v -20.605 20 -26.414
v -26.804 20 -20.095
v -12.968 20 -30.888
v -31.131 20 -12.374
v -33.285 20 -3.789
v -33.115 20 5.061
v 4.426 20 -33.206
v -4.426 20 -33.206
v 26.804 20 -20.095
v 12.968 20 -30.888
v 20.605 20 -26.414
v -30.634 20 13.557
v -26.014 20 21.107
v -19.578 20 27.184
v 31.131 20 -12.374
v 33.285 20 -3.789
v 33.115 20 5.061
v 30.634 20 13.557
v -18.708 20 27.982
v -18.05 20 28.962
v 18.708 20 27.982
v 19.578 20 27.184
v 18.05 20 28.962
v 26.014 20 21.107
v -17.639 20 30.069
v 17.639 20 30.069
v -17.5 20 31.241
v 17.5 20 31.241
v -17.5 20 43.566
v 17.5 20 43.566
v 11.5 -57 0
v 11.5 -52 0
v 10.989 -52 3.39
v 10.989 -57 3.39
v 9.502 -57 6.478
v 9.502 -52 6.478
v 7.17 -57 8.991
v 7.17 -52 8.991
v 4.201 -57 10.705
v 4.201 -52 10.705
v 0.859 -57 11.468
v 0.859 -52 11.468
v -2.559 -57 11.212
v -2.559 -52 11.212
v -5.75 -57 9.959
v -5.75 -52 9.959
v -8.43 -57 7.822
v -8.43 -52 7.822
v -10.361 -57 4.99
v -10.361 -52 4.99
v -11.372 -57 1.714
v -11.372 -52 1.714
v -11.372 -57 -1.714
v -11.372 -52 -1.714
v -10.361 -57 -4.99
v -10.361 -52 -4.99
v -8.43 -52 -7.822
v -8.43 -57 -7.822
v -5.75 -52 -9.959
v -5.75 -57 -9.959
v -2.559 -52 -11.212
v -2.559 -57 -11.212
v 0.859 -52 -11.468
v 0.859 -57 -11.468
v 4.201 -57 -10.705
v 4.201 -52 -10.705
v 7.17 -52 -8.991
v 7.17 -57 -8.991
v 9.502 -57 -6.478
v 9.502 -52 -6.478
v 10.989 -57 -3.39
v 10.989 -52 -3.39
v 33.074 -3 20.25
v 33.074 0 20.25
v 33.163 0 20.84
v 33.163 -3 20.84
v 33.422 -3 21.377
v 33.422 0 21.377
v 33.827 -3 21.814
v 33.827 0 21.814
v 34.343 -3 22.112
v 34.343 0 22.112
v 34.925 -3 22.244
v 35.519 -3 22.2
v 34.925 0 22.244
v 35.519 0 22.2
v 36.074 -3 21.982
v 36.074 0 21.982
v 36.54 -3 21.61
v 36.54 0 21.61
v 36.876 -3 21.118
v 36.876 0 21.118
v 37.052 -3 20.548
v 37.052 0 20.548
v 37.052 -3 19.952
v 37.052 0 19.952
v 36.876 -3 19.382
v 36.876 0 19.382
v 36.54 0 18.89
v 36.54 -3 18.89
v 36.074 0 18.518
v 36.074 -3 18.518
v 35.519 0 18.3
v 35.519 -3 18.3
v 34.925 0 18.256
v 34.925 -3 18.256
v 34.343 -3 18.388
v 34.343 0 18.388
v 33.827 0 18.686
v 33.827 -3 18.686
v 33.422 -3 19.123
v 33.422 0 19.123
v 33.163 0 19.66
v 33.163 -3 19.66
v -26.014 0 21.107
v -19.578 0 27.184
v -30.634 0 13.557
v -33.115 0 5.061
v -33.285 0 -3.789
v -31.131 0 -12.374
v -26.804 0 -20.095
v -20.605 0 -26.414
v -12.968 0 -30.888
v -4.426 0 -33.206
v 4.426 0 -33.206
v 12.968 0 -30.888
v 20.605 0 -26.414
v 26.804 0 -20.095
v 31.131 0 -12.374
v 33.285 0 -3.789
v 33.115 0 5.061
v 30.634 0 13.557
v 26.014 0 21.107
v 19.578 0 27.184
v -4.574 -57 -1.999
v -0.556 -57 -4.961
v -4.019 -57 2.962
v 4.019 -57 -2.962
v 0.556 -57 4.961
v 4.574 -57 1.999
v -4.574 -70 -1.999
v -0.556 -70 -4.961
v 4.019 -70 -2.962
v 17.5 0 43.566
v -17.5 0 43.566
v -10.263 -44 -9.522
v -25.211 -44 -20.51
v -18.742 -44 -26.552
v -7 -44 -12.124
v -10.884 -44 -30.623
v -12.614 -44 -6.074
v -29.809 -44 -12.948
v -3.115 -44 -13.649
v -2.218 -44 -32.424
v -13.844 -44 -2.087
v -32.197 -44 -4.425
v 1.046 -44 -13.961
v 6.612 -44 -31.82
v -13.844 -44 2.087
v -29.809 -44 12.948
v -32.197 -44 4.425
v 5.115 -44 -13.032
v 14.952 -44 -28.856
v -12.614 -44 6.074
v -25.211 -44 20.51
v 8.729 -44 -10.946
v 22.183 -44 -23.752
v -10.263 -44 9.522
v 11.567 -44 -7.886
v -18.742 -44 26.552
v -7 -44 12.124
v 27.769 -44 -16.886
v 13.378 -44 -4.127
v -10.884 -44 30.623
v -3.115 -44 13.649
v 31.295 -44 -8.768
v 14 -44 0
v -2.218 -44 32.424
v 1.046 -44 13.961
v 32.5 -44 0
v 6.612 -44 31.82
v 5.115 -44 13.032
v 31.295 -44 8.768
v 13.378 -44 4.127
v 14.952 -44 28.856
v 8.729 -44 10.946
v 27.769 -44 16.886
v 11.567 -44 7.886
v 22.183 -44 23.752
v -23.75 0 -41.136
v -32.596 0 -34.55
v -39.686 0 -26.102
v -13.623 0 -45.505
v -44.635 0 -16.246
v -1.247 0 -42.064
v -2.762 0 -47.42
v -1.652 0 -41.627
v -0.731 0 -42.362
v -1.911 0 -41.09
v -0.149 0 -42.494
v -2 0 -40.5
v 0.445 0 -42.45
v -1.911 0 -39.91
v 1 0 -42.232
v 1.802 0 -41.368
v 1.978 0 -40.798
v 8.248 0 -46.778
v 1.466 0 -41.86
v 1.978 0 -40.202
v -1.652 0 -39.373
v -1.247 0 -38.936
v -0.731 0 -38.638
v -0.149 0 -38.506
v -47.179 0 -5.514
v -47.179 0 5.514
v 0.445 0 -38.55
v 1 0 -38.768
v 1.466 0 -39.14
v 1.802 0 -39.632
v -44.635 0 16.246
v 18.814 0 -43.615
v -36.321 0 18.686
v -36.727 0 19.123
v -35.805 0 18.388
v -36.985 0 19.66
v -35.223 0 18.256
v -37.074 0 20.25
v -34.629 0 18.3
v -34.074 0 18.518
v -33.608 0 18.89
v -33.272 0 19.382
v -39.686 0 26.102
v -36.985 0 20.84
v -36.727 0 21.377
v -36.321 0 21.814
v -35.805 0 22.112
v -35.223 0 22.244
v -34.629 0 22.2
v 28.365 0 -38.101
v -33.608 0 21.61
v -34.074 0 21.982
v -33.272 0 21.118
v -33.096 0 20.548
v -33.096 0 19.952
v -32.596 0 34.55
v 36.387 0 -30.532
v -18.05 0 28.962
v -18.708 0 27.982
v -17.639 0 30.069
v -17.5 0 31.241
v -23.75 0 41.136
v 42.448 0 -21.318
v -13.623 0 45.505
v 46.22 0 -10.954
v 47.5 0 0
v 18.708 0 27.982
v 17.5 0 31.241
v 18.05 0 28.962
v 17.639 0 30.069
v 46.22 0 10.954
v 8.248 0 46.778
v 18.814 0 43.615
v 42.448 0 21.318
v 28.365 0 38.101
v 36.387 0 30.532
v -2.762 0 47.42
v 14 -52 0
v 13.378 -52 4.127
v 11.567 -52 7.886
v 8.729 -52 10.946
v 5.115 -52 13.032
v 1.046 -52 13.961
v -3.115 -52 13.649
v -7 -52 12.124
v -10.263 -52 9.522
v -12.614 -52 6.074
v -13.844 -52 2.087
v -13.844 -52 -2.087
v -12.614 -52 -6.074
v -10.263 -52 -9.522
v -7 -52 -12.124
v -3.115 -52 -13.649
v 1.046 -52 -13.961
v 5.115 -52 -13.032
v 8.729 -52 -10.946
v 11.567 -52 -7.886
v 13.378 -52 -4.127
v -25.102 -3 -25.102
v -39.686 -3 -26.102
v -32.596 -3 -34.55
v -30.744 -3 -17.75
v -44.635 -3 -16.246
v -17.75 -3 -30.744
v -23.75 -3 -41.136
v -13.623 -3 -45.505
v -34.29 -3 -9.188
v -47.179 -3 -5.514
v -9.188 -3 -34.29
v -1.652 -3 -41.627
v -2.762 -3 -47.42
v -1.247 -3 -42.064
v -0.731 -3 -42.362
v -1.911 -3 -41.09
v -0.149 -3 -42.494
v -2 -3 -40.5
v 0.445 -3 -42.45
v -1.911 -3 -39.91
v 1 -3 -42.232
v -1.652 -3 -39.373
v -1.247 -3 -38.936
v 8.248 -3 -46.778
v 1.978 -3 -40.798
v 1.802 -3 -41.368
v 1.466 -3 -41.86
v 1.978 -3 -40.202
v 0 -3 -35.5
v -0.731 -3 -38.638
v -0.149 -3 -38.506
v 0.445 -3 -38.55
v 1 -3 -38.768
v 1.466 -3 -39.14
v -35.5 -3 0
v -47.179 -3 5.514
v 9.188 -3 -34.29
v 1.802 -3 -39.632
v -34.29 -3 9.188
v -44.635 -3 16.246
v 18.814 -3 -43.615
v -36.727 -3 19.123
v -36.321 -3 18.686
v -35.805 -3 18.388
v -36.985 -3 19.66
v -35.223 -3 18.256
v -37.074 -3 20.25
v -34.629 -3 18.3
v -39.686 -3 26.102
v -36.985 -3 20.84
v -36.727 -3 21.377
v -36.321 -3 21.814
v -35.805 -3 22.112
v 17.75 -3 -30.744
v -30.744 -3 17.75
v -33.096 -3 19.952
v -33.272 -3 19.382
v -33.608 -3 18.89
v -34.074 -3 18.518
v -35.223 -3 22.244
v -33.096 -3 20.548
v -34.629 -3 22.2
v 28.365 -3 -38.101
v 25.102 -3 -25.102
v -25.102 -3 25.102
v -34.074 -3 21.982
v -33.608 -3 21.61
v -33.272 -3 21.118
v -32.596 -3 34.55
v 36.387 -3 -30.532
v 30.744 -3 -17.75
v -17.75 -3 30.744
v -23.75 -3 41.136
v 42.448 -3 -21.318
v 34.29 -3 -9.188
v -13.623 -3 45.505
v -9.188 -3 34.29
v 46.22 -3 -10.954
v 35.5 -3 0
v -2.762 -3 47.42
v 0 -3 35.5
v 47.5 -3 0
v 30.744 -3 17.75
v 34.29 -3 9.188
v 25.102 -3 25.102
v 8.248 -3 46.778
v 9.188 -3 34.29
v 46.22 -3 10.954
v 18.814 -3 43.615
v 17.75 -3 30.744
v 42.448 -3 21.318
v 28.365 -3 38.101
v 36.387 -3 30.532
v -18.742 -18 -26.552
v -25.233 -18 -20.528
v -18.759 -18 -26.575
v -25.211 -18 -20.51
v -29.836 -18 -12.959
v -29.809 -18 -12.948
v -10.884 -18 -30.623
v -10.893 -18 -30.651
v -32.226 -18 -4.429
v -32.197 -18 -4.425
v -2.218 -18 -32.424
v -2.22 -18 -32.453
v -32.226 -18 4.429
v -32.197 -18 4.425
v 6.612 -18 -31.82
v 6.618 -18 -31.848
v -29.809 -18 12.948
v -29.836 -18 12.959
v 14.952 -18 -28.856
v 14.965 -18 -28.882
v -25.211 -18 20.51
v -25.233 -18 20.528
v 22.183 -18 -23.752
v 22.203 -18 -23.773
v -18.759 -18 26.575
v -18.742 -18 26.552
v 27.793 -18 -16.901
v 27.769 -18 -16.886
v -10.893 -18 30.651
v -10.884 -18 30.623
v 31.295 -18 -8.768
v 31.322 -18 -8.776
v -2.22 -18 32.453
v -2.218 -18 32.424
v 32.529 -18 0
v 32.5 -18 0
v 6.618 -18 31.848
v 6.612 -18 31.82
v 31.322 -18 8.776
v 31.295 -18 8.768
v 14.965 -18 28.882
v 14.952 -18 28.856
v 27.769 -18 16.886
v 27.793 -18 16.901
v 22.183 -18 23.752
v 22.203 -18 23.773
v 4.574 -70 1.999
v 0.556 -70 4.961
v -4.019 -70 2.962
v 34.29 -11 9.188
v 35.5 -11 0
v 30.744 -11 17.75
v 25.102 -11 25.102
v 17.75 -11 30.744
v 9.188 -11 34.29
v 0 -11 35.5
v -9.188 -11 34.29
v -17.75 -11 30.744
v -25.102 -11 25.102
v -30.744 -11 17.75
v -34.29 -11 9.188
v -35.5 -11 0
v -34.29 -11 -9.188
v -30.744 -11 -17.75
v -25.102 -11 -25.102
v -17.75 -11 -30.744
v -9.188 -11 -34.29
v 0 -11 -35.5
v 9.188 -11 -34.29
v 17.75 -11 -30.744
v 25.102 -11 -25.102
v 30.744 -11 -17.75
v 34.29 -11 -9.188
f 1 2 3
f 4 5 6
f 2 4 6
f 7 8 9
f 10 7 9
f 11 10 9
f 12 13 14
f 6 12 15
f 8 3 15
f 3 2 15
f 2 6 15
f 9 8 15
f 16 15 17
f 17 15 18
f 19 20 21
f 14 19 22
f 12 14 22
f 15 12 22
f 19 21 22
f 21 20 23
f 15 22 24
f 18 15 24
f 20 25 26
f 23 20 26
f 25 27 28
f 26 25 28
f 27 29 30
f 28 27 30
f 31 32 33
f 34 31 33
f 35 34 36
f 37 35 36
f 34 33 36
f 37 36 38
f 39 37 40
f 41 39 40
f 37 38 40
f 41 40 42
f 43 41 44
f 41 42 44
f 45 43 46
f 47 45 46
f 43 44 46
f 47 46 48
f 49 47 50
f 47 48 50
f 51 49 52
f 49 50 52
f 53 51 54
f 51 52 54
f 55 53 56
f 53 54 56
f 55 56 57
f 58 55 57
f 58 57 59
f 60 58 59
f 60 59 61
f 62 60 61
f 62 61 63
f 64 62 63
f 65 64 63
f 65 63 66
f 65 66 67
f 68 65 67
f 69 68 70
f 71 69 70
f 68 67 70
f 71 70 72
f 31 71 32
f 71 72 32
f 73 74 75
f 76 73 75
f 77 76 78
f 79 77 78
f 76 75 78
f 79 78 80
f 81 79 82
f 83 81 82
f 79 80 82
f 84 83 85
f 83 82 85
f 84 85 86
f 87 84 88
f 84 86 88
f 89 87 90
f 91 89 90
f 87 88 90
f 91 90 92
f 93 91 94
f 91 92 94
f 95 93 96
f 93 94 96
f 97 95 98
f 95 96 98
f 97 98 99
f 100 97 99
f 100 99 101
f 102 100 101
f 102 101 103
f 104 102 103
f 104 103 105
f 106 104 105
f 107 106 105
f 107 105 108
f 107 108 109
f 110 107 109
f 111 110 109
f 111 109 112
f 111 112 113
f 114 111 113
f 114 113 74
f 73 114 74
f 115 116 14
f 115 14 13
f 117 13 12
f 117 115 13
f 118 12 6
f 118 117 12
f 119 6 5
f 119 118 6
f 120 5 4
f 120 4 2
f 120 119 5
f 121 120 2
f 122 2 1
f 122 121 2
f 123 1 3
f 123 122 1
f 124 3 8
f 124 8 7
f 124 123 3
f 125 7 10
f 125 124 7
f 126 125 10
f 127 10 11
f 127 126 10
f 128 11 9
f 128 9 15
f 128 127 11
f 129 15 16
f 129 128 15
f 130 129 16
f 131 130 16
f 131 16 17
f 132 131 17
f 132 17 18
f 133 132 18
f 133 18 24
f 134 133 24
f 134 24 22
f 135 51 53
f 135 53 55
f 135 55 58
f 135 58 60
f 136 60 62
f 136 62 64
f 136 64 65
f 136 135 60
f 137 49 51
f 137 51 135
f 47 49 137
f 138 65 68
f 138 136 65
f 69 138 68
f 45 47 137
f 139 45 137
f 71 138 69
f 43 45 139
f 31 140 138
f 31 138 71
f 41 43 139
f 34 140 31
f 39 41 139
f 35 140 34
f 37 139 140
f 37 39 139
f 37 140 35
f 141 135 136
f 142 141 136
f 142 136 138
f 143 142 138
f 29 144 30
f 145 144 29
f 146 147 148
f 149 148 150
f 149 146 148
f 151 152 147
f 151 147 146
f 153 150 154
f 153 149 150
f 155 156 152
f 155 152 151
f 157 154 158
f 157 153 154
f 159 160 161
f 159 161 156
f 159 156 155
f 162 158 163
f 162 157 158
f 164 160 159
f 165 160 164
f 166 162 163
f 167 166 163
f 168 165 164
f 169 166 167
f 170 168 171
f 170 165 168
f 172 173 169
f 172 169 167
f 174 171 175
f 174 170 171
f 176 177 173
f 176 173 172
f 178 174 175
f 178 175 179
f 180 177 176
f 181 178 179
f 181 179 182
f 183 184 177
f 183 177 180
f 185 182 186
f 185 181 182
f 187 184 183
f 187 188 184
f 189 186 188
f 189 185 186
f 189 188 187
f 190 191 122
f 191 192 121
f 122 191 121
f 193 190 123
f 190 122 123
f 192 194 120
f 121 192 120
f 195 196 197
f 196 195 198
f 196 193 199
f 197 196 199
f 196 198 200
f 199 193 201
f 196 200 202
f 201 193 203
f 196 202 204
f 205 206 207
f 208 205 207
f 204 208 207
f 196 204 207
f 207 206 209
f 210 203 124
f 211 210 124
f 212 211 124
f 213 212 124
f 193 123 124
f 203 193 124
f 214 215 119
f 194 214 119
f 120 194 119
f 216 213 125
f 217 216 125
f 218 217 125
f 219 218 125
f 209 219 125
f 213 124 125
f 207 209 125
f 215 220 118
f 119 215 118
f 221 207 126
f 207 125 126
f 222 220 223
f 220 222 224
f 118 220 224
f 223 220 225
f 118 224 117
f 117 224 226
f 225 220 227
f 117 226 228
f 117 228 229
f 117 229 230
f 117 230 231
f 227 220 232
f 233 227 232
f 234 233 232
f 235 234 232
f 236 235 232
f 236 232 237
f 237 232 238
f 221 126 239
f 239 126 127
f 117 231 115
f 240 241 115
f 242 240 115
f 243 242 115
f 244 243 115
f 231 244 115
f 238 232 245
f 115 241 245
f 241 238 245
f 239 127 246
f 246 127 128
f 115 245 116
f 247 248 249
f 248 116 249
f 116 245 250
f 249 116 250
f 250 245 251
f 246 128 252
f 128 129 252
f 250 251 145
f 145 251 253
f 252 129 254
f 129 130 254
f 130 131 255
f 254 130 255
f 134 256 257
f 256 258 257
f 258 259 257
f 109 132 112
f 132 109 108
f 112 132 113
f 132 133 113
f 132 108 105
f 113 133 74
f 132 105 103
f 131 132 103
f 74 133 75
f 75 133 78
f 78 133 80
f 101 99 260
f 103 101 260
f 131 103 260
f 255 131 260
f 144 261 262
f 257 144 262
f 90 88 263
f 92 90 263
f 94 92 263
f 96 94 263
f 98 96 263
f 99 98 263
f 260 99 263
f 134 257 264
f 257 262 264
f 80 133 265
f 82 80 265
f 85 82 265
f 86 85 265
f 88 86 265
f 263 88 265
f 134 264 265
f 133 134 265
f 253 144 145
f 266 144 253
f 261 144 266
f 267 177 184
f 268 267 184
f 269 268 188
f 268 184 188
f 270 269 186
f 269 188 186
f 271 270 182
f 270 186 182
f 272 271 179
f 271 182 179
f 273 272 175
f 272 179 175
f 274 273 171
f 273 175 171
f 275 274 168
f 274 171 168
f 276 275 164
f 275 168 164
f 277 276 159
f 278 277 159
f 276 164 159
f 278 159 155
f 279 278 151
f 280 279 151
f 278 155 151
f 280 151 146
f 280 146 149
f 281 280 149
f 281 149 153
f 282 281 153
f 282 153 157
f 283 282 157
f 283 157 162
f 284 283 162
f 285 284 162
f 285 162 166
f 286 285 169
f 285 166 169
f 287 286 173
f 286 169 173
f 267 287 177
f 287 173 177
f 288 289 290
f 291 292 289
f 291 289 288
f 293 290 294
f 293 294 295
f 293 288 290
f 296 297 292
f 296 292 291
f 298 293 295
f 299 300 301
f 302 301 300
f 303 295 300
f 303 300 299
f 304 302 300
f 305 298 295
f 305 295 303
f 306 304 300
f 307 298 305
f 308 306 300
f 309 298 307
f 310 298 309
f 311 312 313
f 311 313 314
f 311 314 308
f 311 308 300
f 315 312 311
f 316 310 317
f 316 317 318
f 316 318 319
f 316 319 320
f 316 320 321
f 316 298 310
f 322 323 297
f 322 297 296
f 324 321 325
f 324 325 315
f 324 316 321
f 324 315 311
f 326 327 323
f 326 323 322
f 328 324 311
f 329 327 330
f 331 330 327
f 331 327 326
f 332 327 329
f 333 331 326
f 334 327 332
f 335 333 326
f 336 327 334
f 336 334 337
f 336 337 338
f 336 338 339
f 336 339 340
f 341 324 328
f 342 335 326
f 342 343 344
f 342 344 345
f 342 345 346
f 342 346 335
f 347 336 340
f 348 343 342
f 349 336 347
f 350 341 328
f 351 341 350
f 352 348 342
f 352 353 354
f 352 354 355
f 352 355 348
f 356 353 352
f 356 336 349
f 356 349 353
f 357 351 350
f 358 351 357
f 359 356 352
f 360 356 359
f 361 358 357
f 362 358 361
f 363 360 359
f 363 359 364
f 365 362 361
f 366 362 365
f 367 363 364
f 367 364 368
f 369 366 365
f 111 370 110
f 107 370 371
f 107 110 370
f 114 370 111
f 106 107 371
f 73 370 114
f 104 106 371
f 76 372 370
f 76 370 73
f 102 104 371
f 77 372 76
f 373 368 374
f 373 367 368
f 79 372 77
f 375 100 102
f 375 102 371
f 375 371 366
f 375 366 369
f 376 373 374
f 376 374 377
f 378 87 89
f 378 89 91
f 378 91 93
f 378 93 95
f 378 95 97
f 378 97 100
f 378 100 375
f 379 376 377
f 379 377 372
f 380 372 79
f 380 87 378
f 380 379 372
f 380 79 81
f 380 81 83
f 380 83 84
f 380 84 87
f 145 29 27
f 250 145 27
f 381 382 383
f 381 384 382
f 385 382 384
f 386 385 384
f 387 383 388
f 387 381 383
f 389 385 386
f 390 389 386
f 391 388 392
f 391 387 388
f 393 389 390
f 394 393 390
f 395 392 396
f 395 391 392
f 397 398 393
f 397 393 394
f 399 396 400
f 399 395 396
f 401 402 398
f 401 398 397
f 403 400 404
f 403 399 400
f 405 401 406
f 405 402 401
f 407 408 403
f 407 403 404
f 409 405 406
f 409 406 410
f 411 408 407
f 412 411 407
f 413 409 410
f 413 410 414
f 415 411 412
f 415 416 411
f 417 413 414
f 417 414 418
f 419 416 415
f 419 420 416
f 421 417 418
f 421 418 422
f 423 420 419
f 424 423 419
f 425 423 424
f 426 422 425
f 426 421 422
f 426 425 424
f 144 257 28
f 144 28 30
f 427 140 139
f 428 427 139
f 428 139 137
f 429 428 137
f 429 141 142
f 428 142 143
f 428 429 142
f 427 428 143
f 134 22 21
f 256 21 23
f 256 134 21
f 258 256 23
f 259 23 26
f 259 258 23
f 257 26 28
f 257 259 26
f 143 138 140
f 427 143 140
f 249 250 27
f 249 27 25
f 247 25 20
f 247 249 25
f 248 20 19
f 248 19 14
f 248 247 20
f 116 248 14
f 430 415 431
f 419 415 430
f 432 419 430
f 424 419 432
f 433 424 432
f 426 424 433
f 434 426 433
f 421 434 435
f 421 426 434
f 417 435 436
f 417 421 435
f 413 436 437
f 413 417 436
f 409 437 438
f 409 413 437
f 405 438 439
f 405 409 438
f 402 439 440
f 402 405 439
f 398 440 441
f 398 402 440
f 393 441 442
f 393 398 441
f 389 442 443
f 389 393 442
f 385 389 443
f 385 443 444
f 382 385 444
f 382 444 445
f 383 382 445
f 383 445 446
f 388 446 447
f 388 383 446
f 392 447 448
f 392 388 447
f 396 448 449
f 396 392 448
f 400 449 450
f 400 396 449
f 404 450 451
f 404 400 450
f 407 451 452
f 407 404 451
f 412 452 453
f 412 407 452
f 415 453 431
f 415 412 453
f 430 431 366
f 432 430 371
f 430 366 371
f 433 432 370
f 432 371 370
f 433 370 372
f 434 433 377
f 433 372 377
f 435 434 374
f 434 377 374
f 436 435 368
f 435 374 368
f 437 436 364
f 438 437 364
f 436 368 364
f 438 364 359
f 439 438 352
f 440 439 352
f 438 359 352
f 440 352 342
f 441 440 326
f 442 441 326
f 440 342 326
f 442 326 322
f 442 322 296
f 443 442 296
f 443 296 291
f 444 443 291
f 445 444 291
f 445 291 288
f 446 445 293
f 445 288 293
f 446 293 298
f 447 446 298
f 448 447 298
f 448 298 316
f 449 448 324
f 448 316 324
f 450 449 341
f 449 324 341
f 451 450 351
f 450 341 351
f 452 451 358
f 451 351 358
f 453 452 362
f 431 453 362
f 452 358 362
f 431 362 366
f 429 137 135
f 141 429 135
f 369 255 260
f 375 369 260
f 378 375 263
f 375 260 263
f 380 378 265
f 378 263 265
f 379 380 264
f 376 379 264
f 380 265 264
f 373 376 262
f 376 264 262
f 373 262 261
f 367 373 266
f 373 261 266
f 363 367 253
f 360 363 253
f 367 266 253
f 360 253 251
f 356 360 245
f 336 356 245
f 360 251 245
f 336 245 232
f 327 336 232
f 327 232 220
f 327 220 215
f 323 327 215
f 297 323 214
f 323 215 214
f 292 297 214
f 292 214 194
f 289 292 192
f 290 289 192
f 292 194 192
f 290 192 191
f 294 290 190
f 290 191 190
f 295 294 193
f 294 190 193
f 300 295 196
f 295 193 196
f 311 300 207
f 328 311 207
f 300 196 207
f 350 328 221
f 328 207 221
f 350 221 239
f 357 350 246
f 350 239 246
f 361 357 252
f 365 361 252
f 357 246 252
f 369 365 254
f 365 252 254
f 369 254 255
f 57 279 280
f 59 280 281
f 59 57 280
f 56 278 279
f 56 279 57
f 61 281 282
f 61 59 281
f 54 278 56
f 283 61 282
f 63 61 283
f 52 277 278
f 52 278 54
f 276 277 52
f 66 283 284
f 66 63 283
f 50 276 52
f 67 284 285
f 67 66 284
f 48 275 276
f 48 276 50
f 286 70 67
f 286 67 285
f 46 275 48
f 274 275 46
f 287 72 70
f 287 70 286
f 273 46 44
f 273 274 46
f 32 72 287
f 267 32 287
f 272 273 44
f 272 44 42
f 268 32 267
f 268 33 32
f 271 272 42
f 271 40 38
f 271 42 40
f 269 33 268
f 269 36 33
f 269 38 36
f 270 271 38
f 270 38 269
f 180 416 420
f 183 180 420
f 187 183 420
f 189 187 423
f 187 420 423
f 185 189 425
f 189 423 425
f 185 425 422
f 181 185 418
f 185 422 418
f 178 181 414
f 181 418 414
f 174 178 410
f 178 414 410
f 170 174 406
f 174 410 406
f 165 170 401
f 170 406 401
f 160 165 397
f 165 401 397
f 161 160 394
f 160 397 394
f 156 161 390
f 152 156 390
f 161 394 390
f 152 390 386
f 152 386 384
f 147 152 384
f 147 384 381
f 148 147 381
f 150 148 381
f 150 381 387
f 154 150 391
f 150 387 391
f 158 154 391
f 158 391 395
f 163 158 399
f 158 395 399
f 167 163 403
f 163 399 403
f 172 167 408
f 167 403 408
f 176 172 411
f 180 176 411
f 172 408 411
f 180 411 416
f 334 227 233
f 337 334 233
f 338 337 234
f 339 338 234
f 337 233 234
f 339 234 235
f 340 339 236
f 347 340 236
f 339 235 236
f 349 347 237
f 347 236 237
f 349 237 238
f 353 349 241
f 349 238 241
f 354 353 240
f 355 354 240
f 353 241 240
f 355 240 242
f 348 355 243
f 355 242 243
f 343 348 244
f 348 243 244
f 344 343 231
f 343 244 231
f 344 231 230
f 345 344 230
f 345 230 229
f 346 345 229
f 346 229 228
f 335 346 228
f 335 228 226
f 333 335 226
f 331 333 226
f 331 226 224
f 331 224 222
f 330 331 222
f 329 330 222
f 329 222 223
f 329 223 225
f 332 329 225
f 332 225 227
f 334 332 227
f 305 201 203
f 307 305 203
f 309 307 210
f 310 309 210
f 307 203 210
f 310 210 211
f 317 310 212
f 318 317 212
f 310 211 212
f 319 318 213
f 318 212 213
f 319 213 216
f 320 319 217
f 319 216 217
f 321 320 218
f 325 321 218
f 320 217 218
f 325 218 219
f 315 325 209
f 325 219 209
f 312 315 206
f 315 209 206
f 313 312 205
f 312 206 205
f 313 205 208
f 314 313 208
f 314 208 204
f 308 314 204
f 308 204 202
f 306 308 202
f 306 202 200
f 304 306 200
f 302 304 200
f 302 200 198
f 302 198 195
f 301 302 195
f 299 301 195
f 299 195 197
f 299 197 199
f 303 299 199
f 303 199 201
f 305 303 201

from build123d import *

# Parameters (mm, degrees)
F1_DEPTH  = 20
F2_R      = 47.5
F3_DEPTH  = 3
F4_R      = 35.5
F5_DEPTH  = 8
F6_R      = 35.5
F7_DEPTH  = 7
F7_TAPER  = 23
F8_R      = 32.5
F9_DEPTH  = 26
F10_R     = 14
F11_DEPTH = 8
F12_R     = 11.5
F13_DEPTH = 5
F15_DEPTH = 13
F16_R     = 2
F17_DEPTH = 70.001


with BuildPart() as f1:
    # F0 (on Front) → F1 (new body)
    with BuildSketch(Plane.XZ):
        with BuildLine():
            ThreePointArc((-17.5, 31.2409987036), (-18.0496972232, 28.9617871744), (-19.5779220779, 27.1837261447))
            ThreePointArc((-19.5779220779, 27.1837261447), (0, -33.5), (19.5779220779, 27.1837261447))
            ThreePointArc((19.5779220779, 27.1837261447), (18.0496972232, 28.9617871744), (17.5, 31.2409987036))
            Line((17.5, 31.2409987036), (17.5, 43.5657137142))
            Line((17.5, 43.5657137142), (0, 43.5657137142))
            Line((0, 43.5657137142), (-17.5, 43.5657137142))
            Line((-17.5, 43.5657137142), (-17.5, 31.2409987036))
        make_face()
    extrude(amount=-F1_DEPTH)

    # F2 (on face) → F3 (join)
    with BuildSketch(Plane.XZ):
        Circle(F2_R)
    extrude(amount=F3_DEPTH)

    # F4 (on face) → F5 (join)
    with BuildSketch(Plane.XZ.offset(3)):
        Circle(F4_R)
    extrude(amount=F5_DEPTH)

    # F6 (on face) → F7 (join)
    with BuildSketch(Plane.XZ.offset(11)):
        Circle(F6_R)
    extrude(amount=F7_DEPTH, taper=F7_TAPER)

    # F8 (on face) → F9 (join)
    with BuildSketch(Plane.XZ.offset(18)):
        Circle(F8_R)
    extrude(amount=F9_DEPTH)

    # F10 (on face) → F11 (join)
    with BuildSketch(Plane.XZ.offset(44)):
        Circle(F10_R)
    extrude(amount=F11_DEPTH)

    # F12 (on face) → F13 (join)
    with BuildSketch(Plane.XZ.offset(52)):
        Circle(F12_R)
    extrude(amount=F13_DEPTH)

    # F14 (on face) → F15 (join)
    with BuildSketch(Plane.XZ.offset(57)):
        Polygon((4.5744852646, 1.9992902459), (0.5558064898, 4.9612655713), (-4.0186787748, 2.9619753254), (-4.5744852646, -1.9992902459), (-0.5558064898, -4.9612655713), (4.0186787748, -2.9619753254), align=None)
    extrude(amount=F15_DEPTH)

    # F16 (on face) → F17 (cut, through all)
    with BuildSketch(Plane(origin=(0, 0, 0), x_dir=(-1, 0, 0), z_dir=(0, 1, 0))):
        with Locations((0, -40.5)):
            Circle(F16_R)
        with Locations((-35.0740288533, 20.25)):
            Circle(F16_R)
        with Locations((35.0740288533, 20.25)):
            Circle(F16_R)
    extrude(amount=-F17_DEPTH, mode=Mode.SUBTRACT)


solid = f1.part
